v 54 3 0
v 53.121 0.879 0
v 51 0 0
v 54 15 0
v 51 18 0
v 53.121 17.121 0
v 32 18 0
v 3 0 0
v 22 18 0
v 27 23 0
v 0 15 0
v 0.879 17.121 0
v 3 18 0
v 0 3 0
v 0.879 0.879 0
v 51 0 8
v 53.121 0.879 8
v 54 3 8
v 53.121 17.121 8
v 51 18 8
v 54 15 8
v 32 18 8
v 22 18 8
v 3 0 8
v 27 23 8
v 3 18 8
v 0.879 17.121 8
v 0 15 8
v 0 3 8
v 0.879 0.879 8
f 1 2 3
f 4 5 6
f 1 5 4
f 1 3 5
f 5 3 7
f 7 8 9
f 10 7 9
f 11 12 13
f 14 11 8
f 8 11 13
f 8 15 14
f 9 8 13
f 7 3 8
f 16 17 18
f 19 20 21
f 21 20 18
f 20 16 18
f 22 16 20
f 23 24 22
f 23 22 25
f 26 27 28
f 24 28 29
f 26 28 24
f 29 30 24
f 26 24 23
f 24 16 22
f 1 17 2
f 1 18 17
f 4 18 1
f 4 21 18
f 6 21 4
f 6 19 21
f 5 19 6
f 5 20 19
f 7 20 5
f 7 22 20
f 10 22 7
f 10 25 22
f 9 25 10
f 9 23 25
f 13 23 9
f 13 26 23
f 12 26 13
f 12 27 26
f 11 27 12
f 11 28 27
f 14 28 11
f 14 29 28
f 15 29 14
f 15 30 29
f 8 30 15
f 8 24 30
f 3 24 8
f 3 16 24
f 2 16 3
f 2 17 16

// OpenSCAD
$fn = 32;

// ----------------------------------------------------------------------
// Ratchet pawl: 54 x 18 mm body, beak 5 mm сверху
// ----------------------------------------------------------------------

// --- parameters (mm) ---
profile_height = 8;       // extrusion height
profile_points = 15;      // points of the closed outline

profile = [[0, 3], [0.879, 0.879], [3, 0], [51, 0], [53.121, 0.879], [54, 3], [54, 15], [53.121, 17.121], [51, 18], [32, 18], [27, 23], [22, 18], [3, 18], [0.879, 17.121], [0, 15]];  // single closed polygon, 15 points, counter clockwise

// --- the one profile operation ---
linear_extrude(height = profile_height) polygon(points = profile);
